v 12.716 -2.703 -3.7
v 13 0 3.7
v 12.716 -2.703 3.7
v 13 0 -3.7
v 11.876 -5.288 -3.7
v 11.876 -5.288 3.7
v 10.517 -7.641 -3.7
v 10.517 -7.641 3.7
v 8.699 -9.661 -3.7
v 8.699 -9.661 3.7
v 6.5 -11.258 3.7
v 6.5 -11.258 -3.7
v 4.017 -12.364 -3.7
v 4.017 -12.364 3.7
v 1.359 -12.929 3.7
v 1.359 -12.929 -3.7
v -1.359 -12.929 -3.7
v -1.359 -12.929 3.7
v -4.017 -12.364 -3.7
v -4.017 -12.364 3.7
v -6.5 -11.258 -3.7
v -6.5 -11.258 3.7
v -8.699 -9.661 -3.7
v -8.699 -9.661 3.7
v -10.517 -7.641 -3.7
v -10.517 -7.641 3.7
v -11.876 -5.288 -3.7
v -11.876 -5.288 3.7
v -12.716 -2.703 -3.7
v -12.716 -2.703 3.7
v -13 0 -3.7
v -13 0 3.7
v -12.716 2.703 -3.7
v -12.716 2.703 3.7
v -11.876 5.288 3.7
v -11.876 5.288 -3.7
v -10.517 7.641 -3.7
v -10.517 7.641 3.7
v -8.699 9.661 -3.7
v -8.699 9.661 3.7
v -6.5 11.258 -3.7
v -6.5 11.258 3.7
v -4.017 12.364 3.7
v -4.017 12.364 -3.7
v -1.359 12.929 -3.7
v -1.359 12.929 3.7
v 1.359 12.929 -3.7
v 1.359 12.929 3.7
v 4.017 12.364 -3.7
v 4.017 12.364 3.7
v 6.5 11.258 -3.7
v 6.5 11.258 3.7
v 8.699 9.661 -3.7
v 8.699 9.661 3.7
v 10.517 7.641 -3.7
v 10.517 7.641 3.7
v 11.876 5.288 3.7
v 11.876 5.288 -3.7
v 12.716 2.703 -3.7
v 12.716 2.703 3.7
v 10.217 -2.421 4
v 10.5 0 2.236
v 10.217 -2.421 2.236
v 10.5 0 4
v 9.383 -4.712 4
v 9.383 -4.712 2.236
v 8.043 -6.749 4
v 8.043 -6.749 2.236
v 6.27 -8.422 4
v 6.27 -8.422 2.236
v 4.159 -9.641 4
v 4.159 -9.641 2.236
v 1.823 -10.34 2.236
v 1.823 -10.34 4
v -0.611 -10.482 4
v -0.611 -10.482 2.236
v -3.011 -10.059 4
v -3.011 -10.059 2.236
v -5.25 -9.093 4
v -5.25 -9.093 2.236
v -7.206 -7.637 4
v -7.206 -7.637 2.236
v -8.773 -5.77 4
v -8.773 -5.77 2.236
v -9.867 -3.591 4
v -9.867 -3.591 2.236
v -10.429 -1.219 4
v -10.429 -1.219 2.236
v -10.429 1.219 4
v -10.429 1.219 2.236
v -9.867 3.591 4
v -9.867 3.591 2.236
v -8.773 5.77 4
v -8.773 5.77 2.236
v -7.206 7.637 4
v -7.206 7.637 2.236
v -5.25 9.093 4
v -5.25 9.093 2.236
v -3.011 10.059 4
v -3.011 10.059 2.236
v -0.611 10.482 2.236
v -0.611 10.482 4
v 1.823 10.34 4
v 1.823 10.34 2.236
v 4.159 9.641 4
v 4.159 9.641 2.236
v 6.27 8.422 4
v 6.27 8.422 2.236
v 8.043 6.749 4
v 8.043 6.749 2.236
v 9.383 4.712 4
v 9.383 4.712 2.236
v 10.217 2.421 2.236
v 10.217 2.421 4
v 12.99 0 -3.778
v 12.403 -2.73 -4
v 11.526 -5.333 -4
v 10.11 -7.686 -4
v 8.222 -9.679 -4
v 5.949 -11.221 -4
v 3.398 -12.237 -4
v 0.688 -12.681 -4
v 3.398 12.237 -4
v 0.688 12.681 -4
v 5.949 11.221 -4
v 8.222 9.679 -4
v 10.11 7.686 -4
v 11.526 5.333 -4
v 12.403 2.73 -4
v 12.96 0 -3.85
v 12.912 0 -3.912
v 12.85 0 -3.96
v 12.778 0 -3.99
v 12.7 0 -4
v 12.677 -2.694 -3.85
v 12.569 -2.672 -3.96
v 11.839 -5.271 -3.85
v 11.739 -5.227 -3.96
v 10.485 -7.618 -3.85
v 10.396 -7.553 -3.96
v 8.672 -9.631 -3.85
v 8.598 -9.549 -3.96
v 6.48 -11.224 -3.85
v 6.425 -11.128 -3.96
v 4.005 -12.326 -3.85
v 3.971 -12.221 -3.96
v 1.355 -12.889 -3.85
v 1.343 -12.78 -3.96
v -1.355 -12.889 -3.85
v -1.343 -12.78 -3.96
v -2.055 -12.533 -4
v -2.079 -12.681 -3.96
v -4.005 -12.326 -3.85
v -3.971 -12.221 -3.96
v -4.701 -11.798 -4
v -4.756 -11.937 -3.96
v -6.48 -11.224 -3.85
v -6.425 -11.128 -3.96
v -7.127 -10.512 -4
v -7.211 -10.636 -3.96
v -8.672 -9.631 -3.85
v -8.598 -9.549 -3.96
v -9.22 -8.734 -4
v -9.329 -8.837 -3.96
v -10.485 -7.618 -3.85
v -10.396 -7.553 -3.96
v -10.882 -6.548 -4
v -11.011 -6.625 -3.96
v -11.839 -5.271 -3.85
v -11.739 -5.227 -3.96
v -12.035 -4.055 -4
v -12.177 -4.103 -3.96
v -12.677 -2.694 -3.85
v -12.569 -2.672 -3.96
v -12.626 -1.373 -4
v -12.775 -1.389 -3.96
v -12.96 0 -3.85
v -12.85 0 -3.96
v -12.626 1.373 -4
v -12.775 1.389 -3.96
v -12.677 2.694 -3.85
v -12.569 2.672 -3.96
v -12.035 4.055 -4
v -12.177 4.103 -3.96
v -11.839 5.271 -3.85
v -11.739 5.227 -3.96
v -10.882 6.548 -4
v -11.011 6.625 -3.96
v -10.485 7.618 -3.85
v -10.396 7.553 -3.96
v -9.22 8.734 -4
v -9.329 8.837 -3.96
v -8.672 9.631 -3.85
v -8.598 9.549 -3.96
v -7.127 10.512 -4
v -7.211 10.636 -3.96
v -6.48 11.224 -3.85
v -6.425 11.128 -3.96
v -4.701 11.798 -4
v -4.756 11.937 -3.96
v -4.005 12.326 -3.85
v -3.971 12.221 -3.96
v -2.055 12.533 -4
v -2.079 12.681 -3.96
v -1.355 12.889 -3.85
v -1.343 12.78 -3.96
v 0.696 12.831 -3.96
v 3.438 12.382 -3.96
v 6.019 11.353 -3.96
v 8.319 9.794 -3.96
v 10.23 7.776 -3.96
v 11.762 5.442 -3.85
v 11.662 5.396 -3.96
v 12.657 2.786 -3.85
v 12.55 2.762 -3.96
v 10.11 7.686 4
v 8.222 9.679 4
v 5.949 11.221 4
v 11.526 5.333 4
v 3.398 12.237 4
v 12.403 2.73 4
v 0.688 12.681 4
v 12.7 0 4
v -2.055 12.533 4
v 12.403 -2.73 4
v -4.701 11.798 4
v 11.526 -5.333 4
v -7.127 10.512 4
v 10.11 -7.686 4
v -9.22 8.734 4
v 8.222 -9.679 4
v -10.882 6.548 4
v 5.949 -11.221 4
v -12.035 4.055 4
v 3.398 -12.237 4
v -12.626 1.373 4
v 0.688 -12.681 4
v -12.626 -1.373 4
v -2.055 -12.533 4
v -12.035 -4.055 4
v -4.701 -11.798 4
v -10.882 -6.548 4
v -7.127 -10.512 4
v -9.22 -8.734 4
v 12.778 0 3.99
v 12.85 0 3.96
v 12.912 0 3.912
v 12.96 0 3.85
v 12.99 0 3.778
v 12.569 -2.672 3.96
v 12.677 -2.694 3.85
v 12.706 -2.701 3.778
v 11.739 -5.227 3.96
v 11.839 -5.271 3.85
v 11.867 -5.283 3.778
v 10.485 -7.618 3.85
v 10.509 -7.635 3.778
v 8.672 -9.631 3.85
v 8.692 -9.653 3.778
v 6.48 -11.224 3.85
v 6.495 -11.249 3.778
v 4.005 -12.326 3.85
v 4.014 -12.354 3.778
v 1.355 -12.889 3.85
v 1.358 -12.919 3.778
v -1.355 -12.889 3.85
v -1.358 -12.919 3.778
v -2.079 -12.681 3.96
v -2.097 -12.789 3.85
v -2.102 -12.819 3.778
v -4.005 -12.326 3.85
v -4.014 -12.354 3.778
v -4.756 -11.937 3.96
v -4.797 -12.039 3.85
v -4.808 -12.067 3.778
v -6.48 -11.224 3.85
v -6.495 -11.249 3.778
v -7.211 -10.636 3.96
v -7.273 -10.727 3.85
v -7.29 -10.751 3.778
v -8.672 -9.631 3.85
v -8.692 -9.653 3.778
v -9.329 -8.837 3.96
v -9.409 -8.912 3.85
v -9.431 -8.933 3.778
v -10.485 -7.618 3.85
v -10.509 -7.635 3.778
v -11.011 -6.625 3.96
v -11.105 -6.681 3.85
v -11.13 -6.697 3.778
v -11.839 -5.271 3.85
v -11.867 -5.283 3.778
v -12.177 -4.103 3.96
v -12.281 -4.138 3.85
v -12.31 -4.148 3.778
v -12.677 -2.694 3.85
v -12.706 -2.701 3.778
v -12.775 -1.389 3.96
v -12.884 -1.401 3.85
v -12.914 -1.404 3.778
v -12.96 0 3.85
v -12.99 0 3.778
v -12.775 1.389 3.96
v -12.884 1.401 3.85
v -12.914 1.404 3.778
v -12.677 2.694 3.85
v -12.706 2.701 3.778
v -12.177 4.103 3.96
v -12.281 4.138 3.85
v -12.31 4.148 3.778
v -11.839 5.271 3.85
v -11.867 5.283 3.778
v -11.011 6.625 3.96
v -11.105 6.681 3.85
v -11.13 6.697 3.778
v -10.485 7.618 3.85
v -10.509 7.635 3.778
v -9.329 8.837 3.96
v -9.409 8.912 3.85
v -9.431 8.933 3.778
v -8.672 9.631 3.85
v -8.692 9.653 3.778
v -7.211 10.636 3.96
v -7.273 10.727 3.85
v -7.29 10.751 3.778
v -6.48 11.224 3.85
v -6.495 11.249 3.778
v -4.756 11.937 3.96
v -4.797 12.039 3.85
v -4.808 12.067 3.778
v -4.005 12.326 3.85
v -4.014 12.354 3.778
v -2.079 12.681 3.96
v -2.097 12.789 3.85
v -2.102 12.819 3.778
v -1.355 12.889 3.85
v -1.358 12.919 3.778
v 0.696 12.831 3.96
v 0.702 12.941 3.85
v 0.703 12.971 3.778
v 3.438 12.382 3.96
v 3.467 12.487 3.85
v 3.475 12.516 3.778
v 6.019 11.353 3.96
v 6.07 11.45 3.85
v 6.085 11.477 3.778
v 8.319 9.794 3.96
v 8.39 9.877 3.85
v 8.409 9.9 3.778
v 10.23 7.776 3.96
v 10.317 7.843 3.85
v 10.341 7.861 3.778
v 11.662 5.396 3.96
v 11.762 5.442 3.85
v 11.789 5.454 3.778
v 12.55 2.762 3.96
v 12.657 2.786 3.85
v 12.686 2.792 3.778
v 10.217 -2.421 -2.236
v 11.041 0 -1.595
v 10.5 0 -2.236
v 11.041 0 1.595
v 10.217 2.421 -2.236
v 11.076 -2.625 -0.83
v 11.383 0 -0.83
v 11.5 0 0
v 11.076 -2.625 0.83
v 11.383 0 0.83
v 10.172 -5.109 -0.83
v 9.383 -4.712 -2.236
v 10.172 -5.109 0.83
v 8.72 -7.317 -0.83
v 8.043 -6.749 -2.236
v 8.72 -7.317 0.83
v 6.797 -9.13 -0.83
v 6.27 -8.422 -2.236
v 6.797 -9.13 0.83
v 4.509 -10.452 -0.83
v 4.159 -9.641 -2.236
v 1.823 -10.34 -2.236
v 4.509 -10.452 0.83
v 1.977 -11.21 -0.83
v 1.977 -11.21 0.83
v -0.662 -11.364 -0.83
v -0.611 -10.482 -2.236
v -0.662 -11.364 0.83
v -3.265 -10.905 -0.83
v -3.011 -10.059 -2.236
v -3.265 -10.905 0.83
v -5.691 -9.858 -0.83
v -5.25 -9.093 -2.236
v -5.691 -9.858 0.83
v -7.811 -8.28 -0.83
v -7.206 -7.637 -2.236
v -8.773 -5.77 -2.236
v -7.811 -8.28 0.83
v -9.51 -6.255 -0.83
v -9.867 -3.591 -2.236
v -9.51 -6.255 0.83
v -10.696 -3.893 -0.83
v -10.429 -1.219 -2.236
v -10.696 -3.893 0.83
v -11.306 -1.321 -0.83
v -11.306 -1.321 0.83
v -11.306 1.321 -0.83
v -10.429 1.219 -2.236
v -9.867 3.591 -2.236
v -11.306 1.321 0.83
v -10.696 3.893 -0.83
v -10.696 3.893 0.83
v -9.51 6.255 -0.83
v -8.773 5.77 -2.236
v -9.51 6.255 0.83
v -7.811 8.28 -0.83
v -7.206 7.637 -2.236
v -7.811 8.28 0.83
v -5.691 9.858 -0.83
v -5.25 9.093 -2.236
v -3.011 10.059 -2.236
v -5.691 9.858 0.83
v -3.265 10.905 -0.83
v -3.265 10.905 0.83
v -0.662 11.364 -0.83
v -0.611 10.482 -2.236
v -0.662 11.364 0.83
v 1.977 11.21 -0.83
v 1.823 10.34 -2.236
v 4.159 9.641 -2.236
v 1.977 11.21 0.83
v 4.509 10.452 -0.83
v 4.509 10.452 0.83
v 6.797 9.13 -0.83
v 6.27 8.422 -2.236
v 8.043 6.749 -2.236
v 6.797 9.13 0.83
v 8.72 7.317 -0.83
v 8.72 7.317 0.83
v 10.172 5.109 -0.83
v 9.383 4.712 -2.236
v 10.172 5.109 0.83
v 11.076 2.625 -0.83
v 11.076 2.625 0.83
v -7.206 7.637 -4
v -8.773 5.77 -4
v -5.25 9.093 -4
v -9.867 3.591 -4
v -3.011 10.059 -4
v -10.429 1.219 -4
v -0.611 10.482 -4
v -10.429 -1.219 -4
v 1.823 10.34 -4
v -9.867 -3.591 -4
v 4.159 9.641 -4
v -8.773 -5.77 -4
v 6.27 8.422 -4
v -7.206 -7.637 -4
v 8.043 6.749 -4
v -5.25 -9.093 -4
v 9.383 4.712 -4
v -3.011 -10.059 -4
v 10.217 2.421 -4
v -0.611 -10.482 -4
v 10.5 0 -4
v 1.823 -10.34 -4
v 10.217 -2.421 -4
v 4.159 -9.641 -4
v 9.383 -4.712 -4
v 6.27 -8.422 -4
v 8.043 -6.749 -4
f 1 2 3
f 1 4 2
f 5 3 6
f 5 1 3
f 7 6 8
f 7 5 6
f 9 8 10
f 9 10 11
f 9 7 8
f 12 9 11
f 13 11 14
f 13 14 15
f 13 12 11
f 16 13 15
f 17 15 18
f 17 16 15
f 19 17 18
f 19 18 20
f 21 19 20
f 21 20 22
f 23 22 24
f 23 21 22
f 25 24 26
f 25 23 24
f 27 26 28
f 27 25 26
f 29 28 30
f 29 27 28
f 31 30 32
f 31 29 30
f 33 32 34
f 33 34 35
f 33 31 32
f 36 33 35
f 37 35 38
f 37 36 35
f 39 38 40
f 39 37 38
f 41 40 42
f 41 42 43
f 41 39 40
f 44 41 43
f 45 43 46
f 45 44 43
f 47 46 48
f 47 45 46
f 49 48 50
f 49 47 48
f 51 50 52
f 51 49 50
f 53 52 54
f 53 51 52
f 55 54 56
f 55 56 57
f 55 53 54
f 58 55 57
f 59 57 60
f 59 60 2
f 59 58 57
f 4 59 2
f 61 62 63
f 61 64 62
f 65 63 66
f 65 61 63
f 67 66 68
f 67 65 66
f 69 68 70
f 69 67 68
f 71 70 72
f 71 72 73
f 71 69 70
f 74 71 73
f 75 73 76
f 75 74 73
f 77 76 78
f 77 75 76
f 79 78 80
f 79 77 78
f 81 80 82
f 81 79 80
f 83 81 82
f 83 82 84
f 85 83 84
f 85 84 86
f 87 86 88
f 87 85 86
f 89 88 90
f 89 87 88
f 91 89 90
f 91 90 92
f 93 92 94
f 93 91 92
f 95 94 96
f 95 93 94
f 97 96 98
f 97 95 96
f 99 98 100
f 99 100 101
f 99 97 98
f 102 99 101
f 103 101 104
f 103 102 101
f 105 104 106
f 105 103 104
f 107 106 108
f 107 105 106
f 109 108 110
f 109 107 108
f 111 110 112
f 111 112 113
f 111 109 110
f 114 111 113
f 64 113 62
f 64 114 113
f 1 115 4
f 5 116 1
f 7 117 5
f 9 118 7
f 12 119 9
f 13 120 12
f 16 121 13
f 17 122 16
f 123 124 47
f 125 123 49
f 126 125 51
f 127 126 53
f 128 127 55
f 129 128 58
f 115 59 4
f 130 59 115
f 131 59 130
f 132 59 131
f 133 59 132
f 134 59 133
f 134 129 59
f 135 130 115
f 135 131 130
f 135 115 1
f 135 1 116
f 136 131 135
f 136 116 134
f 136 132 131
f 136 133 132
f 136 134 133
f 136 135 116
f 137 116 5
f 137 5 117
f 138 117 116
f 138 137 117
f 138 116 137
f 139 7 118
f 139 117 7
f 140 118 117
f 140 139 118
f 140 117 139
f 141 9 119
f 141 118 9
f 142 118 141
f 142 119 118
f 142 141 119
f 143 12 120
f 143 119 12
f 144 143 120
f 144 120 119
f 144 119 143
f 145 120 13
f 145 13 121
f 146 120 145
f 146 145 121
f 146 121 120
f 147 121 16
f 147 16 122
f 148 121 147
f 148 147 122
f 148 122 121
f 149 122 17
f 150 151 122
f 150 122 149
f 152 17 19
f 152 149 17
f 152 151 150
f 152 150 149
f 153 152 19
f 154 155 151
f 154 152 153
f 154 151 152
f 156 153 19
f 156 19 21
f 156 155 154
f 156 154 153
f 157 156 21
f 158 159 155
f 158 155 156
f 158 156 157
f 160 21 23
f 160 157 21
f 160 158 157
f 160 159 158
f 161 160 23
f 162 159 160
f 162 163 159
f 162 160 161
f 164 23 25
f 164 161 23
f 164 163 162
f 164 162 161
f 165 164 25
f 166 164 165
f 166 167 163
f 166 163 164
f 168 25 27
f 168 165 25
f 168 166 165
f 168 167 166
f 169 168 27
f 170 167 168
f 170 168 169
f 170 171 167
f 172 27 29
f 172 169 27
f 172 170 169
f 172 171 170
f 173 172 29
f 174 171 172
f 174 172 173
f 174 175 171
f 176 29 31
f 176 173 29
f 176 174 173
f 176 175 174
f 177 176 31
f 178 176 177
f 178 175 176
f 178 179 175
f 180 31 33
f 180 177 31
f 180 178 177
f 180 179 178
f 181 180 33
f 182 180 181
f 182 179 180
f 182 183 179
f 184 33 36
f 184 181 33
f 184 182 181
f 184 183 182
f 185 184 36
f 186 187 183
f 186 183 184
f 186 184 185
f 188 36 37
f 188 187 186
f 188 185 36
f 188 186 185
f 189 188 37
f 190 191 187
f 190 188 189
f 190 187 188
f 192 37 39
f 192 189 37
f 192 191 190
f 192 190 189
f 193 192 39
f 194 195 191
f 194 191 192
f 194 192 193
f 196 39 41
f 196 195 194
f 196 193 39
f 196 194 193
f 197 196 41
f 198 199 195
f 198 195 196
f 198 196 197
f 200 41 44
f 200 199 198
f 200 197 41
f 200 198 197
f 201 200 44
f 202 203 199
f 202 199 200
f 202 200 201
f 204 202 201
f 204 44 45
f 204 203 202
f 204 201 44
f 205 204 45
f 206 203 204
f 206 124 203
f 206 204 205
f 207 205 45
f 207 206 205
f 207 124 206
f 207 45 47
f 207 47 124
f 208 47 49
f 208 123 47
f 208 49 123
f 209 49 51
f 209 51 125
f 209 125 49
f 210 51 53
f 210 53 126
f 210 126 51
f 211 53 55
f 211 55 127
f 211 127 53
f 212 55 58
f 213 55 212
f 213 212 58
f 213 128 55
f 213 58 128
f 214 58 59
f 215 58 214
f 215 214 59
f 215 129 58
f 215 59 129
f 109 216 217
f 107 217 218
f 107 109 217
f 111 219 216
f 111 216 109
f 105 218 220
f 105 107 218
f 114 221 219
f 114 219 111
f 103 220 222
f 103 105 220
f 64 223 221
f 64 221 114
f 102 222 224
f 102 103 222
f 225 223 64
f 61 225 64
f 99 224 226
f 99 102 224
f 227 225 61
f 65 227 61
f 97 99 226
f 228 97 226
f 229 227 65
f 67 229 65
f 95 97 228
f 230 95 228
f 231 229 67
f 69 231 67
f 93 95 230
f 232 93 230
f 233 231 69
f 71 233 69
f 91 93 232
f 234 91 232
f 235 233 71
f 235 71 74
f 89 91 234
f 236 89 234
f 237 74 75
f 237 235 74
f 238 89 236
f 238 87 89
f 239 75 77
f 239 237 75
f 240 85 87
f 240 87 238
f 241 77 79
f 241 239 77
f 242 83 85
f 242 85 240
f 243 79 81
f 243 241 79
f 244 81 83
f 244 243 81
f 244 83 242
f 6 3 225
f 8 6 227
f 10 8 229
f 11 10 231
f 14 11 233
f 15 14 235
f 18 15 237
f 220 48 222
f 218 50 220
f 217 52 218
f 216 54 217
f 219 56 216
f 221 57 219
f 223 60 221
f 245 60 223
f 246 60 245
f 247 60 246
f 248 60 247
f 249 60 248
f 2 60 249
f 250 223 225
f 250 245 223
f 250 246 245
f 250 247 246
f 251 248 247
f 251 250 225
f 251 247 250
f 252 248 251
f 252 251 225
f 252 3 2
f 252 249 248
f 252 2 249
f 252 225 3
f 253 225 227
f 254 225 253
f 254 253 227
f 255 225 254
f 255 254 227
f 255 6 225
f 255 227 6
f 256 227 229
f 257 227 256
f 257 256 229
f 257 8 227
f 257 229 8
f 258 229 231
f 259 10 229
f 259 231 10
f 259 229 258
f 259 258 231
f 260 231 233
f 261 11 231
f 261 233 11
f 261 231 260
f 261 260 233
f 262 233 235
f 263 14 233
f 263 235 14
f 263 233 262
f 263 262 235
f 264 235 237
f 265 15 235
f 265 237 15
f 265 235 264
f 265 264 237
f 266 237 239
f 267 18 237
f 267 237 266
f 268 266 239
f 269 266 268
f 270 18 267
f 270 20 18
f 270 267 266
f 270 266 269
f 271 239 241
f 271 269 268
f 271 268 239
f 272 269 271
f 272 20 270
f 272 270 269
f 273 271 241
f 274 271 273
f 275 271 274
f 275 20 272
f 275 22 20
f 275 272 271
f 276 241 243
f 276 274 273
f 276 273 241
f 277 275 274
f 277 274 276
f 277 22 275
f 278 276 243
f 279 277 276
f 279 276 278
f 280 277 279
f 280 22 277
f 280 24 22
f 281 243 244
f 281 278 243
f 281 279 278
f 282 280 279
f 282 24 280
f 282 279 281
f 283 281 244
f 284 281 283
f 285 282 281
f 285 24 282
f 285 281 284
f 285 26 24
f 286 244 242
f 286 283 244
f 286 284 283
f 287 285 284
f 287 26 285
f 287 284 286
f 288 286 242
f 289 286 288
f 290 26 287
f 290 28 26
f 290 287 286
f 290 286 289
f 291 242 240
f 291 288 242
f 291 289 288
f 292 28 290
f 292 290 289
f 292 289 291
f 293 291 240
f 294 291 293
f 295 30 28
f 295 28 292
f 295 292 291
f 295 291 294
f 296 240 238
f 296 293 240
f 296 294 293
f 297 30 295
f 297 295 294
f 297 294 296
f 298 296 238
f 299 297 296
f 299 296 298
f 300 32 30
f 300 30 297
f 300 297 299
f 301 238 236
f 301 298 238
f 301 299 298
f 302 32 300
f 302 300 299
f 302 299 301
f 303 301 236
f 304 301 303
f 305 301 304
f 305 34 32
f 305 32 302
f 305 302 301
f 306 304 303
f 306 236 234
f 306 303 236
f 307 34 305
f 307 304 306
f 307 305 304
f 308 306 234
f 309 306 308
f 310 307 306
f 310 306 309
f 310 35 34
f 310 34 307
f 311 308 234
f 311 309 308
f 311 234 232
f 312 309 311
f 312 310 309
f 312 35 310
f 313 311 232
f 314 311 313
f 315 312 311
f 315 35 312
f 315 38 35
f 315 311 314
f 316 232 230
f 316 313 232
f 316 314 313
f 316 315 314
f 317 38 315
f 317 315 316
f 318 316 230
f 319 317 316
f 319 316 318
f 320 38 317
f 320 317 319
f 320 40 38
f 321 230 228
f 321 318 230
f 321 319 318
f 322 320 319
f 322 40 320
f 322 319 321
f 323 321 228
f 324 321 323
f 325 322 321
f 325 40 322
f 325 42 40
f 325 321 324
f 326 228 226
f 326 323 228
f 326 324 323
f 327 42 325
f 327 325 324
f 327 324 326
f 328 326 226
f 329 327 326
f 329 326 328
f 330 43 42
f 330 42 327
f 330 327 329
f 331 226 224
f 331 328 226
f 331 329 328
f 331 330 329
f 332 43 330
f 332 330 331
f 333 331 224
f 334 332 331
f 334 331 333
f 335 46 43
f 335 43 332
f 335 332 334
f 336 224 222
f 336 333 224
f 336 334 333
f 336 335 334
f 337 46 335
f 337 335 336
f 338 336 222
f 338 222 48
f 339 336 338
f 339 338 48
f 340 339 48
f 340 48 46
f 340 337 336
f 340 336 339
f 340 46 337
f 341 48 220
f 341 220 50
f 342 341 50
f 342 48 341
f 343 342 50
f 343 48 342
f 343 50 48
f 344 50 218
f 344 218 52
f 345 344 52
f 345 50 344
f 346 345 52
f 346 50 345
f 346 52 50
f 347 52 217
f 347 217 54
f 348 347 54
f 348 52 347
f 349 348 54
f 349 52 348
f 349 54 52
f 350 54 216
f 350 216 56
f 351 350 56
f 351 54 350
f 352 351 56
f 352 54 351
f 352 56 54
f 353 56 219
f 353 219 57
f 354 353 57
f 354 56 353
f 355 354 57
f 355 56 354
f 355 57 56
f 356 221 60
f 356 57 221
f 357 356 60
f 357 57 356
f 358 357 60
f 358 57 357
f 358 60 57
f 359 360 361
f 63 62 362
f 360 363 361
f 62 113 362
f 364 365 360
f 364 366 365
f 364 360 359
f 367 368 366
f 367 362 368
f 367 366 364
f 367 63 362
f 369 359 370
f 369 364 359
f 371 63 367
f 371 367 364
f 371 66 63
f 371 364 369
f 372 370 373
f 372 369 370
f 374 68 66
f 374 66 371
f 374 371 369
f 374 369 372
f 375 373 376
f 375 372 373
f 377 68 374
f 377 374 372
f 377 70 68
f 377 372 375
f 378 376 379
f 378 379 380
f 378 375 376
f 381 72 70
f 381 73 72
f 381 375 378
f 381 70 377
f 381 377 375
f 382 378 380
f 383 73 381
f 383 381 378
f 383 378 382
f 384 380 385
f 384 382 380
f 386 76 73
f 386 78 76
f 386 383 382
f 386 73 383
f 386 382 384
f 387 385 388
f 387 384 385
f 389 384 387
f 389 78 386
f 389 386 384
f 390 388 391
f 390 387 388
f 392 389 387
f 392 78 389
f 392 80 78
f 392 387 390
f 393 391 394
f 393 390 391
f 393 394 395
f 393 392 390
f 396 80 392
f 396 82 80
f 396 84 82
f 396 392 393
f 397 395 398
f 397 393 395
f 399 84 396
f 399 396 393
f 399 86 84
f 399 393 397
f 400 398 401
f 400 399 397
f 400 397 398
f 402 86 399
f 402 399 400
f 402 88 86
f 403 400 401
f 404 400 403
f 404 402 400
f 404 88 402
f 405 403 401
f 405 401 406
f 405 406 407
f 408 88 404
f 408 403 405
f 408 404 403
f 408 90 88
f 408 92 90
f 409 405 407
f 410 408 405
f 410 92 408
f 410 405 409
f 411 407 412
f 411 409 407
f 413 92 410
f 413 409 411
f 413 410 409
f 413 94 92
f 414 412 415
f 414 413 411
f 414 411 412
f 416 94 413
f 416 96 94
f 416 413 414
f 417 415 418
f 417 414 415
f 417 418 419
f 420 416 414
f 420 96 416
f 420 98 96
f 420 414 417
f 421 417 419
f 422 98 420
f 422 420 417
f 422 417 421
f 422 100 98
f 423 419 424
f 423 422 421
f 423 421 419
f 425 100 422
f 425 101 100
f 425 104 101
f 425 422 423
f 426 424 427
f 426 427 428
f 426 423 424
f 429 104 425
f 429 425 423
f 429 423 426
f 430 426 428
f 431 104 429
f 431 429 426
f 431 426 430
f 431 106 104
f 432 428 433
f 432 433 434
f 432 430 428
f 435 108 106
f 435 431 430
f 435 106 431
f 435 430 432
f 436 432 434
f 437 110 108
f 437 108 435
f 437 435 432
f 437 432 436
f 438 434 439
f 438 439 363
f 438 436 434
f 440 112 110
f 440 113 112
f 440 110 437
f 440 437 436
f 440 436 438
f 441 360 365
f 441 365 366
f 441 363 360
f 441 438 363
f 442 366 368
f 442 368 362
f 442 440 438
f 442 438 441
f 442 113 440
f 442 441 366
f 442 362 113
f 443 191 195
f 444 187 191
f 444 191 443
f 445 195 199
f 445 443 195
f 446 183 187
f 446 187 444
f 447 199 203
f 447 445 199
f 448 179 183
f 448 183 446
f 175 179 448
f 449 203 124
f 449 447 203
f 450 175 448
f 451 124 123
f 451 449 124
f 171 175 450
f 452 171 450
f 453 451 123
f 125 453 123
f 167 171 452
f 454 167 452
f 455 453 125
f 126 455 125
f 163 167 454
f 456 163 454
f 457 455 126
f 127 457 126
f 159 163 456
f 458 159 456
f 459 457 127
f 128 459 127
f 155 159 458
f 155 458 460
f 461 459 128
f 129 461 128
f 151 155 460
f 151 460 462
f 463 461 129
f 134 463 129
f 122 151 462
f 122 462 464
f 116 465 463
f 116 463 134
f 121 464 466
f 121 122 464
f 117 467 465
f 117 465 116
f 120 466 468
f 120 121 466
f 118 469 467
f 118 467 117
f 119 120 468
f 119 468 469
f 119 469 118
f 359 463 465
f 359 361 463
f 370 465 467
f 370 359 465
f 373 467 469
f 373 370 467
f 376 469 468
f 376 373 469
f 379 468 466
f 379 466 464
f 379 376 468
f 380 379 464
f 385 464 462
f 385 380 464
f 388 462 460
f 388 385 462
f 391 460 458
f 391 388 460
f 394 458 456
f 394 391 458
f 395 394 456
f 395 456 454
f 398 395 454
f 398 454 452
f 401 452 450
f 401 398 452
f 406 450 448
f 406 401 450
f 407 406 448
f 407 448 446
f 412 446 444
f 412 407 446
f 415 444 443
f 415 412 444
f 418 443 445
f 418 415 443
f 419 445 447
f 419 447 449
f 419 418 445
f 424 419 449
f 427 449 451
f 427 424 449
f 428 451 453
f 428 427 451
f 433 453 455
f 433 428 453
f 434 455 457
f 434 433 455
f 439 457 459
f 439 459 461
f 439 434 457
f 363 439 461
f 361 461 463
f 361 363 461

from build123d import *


with BuildPart() as part:
    # Sketch1 → Revolve1 (revolve)
    with BuildSketch(Plane(origin=(0, 0, 0), x_dir=(0, 0, -1), z_dir=(1, 0, 0)), mode=Mode.PRIVATE) as revolve1_sk:
        with BuildLine():
            Line((-3.7, 13), (3.7, 13))
            ThreePointArc((3.7, 13), (3.912132034, 12.912132034), (4, 12.7))
            Line((4, 12.7), (4, 10.5))
            Line((4, 10.5), (2.236067977, 10.5))
            ThreePointArc((2.236067977, 10.5), (0, 11.5), (-2.236067977, 10.5))
            Line((-2.236067977, 10.5), (-4, 10.5))
            Line((-4, 10.5), (-4, 12.7))
            ThreePointArc((-4, 12.7), (-3.912132034, 12.912132034), (-3.7, 13))
        make_face()
    revolve(revolve1_sk.sketch.rotate(Axis((0, 0, 8.516129032), (0, 0, -1)), 90), axis=Axis((0, 0, 8.516129032), (0, 0, -1)))


solid = part.part
